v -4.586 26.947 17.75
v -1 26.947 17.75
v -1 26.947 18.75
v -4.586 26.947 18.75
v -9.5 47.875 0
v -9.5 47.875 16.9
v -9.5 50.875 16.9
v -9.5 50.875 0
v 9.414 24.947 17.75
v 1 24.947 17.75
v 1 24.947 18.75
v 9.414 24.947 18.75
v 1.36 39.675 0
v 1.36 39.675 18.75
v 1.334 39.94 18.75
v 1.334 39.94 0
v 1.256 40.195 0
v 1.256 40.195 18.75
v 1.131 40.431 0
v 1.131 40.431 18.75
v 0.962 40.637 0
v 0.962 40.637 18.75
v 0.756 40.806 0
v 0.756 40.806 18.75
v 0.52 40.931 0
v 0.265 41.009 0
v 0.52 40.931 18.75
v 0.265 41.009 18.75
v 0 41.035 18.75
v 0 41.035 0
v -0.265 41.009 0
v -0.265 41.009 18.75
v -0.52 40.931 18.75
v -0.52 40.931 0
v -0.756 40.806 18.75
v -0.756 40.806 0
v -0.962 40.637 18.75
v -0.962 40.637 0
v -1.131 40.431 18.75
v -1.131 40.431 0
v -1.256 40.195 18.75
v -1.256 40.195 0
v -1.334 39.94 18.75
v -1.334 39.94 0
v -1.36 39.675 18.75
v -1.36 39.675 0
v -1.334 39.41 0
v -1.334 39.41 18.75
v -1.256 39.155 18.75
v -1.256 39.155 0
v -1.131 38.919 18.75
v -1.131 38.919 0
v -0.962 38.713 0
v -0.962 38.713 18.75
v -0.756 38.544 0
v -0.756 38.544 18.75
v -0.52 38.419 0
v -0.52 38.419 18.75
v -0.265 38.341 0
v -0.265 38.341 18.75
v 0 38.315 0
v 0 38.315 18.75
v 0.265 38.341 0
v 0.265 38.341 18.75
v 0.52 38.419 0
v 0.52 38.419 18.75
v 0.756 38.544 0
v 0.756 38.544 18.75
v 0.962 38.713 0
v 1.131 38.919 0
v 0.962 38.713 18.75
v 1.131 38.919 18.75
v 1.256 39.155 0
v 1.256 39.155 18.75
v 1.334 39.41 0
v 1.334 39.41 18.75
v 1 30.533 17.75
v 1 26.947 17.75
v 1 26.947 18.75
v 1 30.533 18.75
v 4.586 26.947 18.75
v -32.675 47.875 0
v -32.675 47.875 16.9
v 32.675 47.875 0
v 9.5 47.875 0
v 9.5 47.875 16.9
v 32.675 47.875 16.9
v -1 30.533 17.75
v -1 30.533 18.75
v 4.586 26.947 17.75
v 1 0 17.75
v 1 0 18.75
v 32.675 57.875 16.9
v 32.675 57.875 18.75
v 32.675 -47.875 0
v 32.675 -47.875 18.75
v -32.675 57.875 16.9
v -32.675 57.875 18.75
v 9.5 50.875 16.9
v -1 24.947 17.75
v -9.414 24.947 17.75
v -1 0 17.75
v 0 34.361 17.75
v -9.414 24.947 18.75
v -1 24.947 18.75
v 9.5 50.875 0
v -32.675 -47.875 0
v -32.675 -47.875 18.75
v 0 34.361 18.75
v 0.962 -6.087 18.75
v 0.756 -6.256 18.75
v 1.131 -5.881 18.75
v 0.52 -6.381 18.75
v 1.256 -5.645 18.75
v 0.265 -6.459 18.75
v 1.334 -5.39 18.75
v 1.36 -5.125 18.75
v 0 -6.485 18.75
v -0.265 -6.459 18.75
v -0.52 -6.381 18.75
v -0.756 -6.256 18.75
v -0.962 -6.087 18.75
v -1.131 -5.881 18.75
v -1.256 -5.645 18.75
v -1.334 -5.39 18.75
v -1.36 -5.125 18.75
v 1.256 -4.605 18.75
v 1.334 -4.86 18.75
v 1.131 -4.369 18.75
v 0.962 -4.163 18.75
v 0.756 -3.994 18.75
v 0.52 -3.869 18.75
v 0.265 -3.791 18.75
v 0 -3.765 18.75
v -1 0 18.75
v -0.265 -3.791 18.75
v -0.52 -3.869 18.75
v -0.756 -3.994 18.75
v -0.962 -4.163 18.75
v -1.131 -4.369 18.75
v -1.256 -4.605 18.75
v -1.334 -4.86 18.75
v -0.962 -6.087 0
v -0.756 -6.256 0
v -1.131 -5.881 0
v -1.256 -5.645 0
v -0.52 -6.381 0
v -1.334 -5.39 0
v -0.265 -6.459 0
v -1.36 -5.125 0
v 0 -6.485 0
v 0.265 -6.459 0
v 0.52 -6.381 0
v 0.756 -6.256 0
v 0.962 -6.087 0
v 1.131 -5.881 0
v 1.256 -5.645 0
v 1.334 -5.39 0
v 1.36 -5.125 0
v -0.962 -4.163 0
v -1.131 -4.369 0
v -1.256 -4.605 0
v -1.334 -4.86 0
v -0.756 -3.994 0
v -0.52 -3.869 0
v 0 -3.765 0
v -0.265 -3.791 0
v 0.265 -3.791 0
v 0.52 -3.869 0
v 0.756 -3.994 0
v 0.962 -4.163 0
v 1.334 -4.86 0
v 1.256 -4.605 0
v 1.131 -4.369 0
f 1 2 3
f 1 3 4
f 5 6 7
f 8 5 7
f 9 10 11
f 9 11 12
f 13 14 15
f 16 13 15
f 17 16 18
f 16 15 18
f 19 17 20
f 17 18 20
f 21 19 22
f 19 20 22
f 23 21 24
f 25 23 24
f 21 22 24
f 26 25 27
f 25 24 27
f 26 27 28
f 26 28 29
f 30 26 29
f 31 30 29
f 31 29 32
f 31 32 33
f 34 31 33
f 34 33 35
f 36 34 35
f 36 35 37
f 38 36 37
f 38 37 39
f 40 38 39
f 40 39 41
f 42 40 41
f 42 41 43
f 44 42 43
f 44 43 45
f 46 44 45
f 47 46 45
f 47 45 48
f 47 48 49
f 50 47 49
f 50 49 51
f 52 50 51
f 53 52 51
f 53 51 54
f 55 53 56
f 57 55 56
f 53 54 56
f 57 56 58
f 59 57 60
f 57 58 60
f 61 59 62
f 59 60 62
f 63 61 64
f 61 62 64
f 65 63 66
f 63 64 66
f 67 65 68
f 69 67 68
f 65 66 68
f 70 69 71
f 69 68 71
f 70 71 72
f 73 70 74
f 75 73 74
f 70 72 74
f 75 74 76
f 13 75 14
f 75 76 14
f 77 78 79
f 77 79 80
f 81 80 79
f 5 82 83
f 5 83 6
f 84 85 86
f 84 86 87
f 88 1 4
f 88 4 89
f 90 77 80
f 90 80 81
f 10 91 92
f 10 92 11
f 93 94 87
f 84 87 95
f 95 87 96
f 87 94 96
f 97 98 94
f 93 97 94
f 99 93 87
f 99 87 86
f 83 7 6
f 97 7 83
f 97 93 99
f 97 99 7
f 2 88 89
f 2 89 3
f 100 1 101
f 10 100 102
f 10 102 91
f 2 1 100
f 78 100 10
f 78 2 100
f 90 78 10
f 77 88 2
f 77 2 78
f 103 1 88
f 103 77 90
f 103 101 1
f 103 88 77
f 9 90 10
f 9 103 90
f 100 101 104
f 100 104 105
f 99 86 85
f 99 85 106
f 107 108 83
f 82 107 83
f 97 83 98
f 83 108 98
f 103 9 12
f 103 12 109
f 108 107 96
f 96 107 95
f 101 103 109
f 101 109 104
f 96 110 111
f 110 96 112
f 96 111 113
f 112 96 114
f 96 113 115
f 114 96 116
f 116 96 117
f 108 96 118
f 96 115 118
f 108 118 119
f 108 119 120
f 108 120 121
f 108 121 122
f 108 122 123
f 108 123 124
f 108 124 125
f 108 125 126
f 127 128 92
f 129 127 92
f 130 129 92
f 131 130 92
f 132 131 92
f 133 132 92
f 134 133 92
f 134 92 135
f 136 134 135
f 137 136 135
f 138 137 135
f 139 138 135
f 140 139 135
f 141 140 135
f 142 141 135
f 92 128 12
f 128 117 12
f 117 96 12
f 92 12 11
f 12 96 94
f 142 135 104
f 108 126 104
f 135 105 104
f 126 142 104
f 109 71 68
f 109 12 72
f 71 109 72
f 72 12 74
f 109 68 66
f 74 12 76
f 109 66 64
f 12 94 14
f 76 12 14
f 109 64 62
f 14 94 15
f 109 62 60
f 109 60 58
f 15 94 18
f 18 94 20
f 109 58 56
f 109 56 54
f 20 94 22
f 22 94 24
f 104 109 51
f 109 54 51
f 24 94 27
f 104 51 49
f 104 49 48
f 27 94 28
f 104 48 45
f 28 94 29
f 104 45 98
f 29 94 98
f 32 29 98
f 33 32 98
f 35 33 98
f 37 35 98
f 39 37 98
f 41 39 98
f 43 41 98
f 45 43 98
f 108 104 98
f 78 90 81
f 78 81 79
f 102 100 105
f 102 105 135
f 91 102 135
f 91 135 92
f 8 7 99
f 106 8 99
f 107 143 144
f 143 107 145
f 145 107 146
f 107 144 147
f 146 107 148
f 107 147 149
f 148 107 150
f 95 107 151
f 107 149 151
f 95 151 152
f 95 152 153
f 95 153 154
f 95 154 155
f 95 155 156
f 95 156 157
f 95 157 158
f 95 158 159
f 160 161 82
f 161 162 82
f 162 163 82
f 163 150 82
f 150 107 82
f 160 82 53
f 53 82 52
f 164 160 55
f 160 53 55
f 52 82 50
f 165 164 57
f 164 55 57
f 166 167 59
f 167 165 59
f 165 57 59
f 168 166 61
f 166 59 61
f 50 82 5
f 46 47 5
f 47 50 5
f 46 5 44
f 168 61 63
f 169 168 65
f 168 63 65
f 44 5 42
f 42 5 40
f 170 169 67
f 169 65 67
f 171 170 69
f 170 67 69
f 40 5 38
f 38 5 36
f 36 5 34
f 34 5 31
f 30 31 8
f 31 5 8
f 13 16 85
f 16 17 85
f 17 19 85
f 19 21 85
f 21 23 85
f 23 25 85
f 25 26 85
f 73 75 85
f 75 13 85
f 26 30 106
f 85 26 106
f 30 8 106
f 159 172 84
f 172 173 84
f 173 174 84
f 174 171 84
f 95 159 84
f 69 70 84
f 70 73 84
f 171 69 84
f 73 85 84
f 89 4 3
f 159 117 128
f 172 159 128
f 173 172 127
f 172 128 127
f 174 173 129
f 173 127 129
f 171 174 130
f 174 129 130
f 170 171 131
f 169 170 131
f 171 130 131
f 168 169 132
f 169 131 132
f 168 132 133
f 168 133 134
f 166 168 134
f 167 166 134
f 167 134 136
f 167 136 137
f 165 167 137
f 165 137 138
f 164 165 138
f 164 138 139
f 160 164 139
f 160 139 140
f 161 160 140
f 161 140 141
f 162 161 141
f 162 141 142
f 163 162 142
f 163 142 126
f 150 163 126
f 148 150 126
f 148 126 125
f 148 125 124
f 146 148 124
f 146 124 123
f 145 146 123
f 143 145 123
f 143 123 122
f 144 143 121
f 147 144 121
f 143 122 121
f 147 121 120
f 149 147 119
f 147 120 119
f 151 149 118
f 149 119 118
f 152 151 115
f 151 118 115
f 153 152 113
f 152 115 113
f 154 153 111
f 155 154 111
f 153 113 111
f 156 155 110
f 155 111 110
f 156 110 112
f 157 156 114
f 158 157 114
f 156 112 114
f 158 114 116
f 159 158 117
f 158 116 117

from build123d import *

# Parameters (mm, degrees)
SKETCH1_W               = 65.35
SKETCH1_H               = 95.75
BOSS_EXTRUDE1_DEPTH     = 18.75
SKETCH2_R               = 1.36
CUT_EXTRUDE1_DEPTH      = 61.919896175
CUT_EXTRUDE_THIN1_START = -1
CUT_EXTRUDE_THIN1_DEPTH = 1
SKETCH5_W               = 19
SKETCH5_H               = 3
BOSS_EXTRUDE2_DEPTH     = 18.75
BOSS_EXTRUDE3_DEPTH     = 1.85


# Read off the part's stored shape, not the designer's step: Cut-Extrude-Thin1
with BuildPart() as part:
    # Sketch1 → Boss-Extrude1 (new body)
    with BuildSketch(Plane.XY):
        Rectangle(SKETCH1_W, SKETCH1_H)
    extrude(amount=BOSS_EXTRUDE1_DEPTH)

    # Sketch2 → Cut-Extrude1 (cut, through all)
    with BuildSketch(Plane.XY.offset(18.75)):
        with Locations((0, 39.675)):
            Circle(SKETCH2_R)
        with Locations((0, -5.125)):
            Circle(SKETCH2_R)
    extrude(amount=-CUT_EXTRUDE1_DEPTH, mode=Mode.SUBTRACT)

    # Cut-Extrude-Thin1 outline → Cut-Extrude-Thin1 (cut)
    with BuildSketch(Plane.XY.offset(18.75).offset(CUT_EXTRUDE_THIN1_START)):
        Polygon((1, 0), (1, 24.947040452), (9.414099592, 24.947040452), (0, 34.361140044), (-9.414099592, 24.947040452), (-1, 24.947040452), (-1, 0), align=None)
        Polygon((-4.585672467, 26.947040452), (-1, 30.532712919), (-1, 26.947040452), align=None, mode=Mode.SUBTRACT)
        Polygon((1, 26.947040452), (1, 30.532712919), (4.585672467, 26.947040452), align=None, mode=Mode.SUBTRACT)
    extrude(amount=CUT_EXTRUDE_THIN1_DEPTH, mode=Mode.SUBTRACT)

    # Sketch5 → Boss-Extrude2 (add)
    with BuildSketch(Plane.XY.offset(18.75)):
        with Locations((0, 49.375)):
            Rectangle(SKETCH5_W, SKETCH5_H)
    extrude(amount=-BOSS_EXTRUDE2_DEPTH)

    # Sketch6 → Boss-Extrude3 (add)
    with BuildSketch(Plane.XY.offset(18.75)):
        Polygon((-32.675, 57.875), (32.675, 57.875), (32.675, 47.875), (9.5, 47.875), (9.5, 50.875), (-9.5, 50.875), (-9.5, 47.875), (-32.675, 47.875), align=None)
    extrude(amount=-BOSS_EXTRUDE3_DEPTH)


solid = part.part
